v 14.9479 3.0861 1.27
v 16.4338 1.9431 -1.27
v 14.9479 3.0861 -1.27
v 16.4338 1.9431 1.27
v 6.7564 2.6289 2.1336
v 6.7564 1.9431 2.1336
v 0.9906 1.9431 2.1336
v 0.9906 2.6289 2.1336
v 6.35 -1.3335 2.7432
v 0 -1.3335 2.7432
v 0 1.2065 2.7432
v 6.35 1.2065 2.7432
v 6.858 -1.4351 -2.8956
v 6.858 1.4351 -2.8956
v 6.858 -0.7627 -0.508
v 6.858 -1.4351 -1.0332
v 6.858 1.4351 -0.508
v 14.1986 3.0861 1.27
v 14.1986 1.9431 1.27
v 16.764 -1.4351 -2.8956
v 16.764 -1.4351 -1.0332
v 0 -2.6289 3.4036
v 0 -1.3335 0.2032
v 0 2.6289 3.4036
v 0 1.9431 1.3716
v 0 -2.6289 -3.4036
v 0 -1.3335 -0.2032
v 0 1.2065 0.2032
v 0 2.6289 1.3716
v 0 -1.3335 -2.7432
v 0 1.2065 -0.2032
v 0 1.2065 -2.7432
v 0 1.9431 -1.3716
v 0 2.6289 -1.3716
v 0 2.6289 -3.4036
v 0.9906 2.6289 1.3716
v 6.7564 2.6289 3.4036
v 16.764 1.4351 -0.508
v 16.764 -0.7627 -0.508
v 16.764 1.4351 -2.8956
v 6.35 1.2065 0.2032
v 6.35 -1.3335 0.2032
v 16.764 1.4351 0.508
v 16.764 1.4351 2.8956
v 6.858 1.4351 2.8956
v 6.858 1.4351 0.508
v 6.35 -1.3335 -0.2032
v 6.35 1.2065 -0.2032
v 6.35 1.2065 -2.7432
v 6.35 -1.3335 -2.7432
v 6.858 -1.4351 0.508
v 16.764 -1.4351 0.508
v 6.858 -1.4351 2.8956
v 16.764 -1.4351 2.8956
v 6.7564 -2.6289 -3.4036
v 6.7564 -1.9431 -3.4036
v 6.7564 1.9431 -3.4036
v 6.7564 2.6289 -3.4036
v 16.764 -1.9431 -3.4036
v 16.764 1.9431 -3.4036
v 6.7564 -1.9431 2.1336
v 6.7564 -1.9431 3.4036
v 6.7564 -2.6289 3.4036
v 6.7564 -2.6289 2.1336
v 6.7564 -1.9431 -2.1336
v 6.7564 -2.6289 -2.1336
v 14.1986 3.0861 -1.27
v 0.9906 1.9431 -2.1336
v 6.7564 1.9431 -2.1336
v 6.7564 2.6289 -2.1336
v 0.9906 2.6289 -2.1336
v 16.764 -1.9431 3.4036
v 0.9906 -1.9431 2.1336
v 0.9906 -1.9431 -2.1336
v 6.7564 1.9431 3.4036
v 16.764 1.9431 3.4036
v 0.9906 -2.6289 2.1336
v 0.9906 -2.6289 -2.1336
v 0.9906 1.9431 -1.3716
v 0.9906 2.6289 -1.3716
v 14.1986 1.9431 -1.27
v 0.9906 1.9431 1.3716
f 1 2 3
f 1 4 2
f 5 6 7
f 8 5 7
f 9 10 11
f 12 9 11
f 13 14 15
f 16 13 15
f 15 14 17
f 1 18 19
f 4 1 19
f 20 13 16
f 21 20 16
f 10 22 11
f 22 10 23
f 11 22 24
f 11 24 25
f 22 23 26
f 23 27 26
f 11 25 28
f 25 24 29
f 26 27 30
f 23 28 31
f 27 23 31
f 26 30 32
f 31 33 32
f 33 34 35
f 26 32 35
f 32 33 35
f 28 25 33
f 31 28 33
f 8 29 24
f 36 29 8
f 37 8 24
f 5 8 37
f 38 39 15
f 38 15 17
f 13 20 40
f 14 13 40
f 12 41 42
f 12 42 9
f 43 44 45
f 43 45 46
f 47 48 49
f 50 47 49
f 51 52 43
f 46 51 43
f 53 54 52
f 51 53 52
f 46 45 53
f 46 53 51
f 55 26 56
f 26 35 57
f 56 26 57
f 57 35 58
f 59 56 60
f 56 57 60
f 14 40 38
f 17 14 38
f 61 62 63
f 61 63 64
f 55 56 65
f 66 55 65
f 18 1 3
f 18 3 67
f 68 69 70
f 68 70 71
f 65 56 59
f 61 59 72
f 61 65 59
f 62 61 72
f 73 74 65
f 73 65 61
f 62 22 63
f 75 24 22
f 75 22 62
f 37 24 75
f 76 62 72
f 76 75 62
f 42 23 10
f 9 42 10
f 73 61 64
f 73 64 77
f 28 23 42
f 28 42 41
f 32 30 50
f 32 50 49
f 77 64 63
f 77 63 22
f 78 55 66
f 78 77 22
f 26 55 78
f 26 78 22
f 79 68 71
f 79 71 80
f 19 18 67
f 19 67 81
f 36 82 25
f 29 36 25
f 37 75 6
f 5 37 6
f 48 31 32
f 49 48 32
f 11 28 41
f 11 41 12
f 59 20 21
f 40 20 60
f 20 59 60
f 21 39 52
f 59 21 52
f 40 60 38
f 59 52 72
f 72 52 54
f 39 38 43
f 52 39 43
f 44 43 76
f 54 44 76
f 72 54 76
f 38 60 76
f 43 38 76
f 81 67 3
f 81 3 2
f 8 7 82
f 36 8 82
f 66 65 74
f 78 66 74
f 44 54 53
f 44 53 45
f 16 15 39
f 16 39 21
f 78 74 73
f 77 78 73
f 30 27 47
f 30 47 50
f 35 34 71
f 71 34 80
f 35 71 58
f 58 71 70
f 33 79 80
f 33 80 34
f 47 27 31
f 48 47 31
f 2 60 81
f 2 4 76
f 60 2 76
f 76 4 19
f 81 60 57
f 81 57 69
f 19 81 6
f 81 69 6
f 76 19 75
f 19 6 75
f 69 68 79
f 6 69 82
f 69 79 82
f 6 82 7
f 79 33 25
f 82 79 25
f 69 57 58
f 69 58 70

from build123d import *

# Parameters (mm, degrees)
SKETCH1_W      = 3.4036
SKETCH1_H      = 3.8862
EXTRUDE1_DEPTH = 16.764
EXTRUDE2_DEPTH = 0.6858
EXTRUDE3_DEPTH = 0.6858
EXTRUDE4_DEPTH = 1.27
SKETCH5_W      = 2.3876
SKETCH5_H      = 2.8702
EXTRUDE5_DEPTH = 9.906
SKETCH6_W      = 2.54
SKETCH6_H      = 2.54
EXTRUDE6_DEPTH = 6.35
EXTRUDE7_DEPTH = 9.906


with BuildPart() as part:
    # Sketch1 → Extrude1 (new body)
    with BuildSketch(Plane(origin=(0, 0, 0), x_dir=(0, 0, -1), z_dir=(1, 0, 0))):
        with Locations((-1.7018, 0)):
            Rectangle(SKETCH1_W, SKETCH1_H)
    extrude1 = extrude(amount=EXTRUDE1_DEPTH)

    # Sketch2 → Extrude2 (add)
    with BuildSketch(Plane(origin=(0, 1.9431, 0), x_dir=(1, 0, 0), z_dir=(0, 1, 0))):
        Polygon((0, -3.4036), (6.7564, -3.4036), (6.7564, -2.1336), (0.9906, -2.1336), (0.9906, -1.3716), (0, -1.3716), align=None)
    extrude2 = extrude(amount=EXTRUDE2_DEPTH)

    # Sketch3 → Extrude3 (add)
    with BuildSketch(Plane.XZ.offset(1.9431)):
        Polygon((0, 3.4036), (6.7564, 3.4036), (6.7564, 2.1336), (0.9906, 2.1336), (0.9906, 0), (0, 0), align=None)
    extrude3 = extrude(amount=EXTRUDE3_DEPTH)

    # Sketch4 → Extrude4 (add)
    with BuildSketch(Plane.XY):
        Polygon((16.4338, 1.9431), (14.9479, 3.0861), (14.1986, 3.0861), (14.1986, 1.9431), align=None)
    extrude4 = extrude(amount=EXTRUDE4_DEPTH)

    # Sketch5 → Extrude5 (cut)
    with BuildSketch(Plane(origin=(16.764, 0, 0), x_dir=(0, 0, -1), z_dir=(1, 0, 0))):
        with Locations((-1.7018, 0)):
            Rectangle(SKETCH5_W, SKETCH5_H)
    extrude5 = extrude(amount=-EXTRUDE5_DEPTH, mode=Mode.SUBTRACT)

    # Sketch6 → Extrude6 (cut)
    with BuildSketch(Plane.ZY):
        with Locations((1.4732, -0.0635)):
            Rectangle(SKETCH6_W, SKETCH6_H)
    extrude6 = extrude(amount=-EXTRUDE6_DEPTH, mode=Mode.SUBTRACT)

    # Mirror1: Extrude1, Extrude2, Extrude3, Extrude4, Extrude5, Extrude6 across Front Plane
    add(extrude1.mirror(Plane.XY))
    add(extrude2.mirror(Plane.XY))
    add(extrude3.mirror(Plane.XY))
    add(extrude4.mirror(Plane.XY))
    add(extrude5.mirror(Plane.XY), mode=Mode.SUBTRACT)
    add(extrude6.mirror(Plane.XY), mode=Mode.SUBTRACT)

    # Sketch7 → Extrude7 (add)
    with BuildSketch(Plane(origin=(6.858, 0, 0), x_dir=(0, 0, -1), z_dir=(1, 0, 0))):
        Polygon((0.508, -0.762663848), (1.033234934, -1.4351), (0.508, -1.4351), align=None)
    extrude(amount=EXTRUDE7_DEPTH)


solid = part.part
